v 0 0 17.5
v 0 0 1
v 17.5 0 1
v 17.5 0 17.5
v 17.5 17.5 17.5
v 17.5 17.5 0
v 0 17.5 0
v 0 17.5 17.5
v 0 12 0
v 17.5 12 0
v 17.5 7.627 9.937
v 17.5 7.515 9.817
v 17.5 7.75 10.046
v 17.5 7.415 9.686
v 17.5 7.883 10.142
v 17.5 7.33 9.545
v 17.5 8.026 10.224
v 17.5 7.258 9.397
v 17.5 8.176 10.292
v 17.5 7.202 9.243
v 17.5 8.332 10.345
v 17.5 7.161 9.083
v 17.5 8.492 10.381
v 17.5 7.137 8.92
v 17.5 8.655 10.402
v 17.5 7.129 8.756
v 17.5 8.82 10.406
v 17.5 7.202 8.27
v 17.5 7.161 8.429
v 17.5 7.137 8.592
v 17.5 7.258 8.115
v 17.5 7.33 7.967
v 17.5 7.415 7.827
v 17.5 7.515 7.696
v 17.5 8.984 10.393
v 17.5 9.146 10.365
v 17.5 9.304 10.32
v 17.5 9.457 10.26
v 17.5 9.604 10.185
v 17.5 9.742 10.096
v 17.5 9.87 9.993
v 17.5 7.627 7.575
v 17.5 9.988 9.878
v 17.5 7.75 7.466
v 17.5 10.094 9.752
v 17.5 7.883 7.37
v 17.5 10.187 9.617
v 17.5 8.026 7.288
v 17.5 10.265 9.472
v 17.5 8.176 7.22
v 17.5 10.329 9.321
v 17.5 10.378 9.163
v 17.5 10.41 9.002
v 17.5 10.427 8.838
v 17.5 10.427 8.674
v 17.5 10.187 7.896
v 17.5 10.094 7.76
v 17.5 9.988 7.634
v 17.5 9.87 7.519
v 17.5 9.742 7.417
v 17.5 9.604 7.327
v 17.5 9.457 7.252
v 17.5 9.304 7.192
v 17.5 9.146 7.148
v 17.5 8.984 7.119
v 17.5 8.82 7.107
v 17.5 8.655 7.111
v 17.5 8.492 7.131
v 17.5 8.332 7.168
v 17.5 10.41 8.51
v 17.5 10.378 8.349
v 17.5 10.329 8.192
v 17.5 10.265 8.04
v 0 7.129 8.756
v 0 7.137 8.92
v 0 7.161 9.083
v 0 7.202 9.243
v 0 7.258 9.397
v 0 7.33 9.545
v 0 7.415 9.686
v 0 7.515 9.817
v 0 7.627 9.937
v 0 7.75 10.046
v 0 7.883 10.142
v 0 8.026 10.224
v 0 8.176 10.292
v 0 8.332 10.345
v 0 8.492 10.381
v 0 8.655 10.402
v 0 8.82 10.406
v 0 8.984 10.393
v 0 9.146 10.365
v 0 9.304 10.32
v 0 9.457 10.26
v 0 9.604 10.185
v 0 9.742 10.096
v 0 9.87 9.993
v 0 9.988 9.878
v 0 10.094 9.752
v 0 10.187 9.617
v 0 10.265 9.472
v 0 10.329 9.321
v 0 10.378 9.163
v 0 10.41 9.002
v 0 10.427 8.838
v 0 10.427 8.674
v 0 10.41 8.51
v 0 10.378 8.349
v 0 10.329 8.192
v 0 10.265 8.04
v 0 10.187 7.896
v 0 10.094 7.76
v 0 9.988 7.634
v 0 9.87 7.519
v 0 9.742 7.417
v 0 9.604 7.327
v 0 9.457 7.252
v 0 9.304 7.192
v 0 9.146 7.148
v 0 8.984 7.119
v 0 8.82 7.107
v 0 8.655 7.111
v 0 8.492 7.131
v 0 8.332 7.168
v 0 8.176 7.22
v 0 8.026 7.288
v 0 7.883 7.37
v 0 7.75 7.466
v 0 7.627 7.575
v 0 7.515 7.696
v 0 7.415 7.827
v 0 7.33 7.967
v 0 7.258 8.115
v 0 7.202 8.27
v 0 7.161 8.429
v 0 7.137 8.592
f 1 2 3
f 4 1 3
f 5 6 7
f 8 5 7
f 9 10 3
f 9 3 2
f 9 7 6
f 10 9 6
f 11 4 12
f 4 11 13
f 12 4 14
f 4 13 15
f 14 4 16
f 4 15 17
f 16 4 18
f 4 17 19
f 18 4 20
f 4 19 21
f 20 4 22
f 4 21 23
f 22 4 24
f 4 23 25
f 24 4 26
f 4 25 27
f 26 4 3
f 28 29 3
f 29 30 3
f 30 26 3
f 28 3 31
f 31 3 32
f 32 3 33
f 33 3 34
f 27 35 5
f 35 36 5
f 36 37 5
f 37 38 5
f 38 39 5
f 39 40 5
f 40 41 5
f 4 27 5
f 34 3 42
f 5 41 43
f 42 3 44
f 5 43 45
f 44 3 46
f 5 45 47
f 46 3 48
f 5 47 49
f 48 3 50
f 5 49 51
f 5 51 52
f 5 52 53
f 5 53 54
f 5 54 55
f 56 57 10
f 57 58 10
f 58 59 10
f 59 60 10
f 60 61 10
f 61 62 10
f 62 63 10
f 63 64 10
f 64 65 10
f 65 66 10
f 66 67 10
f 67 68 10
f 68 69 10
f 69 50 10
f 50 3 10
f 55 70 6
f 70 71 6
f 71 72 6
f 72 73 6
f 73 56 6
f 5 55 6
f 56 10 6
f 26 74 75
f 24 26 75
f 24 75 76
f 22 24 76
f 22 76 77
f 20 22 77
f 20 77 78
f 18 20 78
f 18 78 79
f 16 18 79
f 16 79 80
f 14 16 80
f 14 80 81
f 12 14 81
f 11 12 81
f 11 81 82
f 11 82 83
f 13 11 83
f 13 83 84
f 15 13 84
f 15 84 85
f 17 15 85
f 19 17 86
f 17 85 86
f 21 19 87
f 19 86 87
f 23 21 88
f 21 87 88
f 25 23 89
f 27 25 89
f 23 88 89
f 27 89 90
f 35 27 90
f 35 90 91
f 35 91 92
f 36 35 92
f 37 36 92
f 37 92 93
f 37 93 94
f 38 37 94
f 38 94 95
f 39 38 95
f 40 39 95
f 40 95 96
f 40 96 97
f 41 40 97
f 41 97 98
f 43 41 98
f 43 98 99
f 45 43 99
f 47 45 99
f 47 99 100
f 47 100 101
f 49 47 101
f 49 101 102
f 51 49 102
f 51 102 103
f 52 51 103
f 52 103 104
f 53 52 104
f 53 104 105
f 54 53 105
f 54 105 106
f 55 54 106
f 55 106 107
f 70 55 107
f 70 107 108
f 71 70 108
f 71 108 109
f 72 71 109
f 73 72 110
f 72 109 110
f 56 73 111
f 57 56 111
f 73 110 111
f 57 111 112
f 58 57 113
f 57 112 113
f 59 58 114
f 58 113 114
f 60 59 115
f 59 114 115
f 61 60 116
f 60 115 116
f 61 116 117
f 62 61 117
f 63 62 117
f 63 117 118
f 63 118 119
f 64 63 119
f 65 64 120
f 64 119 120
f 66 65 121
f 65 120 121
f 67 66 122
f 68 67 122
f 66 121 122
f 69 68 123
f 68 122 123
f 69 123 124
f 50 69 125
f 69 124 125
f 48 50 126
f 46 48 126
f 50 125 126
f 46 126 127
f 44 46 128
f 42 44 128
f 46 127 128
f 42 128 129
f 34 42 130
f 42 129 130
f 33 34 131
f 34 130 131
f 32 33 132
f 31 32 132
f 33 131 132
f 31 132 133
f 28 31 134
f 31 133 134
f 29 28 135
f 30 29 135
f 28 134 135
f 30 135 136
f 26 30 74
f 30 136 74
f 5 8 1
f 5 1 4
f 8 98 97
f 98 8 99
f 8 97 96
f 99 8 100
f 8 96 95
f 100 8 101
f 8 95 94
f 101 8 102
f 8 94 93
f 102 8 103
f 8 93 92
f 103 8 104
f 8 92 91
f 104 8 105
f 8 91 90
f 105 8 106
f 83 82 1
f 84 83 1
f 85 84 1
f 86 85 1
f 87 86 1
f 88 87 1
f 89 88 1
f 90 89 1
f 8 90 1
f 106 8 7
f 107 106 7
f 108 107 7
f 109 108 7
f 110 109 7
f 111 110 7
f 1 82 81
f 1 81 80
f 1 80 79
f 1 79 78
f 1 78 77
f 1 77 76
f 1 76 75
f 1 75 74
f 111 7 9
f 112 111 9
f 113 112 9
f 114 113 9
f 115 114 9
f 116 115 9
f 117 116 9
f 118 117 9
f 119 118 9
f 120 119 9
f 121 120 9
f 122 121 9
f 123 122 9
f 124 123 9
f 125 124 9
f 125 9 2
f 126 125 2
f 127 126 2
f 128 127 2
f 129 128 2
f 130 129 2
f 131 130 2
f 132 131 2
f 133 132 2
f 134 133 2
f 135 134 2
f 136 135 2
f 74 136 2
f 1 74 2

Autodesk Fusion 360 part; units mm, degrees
sketch "Sketch1" plane through (0, 0, 0) normal (0, 0, 1) x (1, 0, 0)
  line L0 (0, 0) -> (17.5, 0)
  line L1 (17.5, 0) -> (17.5, 17.5)
  line L2 (17.5, 17.5) -> (0, 17.5)
  line L3 (0, 17.5) -> (0, 0)
  dimension "d1" = 17.5
  dimension "d2" = 17.5
extrude "Extrude1" add sketch "Sketch1" along normal blind 17.5
sketch "Sketch2" plane through (0, 0, 0) normal (-1, 0, 0) x (0, -1, 0)
  line L0 (-17.5, 0) -> (0, 0)
  line L1 (0, 0) -> (0, 17.5)
  line L2 (0, 17.5) -> (-17.5, 17.5)
  line L3 (-17.5, 17.5) -> (-17.5, 0)
  circle A0 centre (-8.7787, 8.7562) radius 8.7563
  circle A1 centre (-8.7787, 8.7562) radius 1.65
  dimension "d5" = 3.3
extrude "Extrude2" cut sketch "Sketch2" against normal blind 33 contours A1
chamfer "Chamfer1" distance 1 distance2 12 1 edges at (8.75, 0, 0) measured on face at (5.8333, 0, 5.8333)
